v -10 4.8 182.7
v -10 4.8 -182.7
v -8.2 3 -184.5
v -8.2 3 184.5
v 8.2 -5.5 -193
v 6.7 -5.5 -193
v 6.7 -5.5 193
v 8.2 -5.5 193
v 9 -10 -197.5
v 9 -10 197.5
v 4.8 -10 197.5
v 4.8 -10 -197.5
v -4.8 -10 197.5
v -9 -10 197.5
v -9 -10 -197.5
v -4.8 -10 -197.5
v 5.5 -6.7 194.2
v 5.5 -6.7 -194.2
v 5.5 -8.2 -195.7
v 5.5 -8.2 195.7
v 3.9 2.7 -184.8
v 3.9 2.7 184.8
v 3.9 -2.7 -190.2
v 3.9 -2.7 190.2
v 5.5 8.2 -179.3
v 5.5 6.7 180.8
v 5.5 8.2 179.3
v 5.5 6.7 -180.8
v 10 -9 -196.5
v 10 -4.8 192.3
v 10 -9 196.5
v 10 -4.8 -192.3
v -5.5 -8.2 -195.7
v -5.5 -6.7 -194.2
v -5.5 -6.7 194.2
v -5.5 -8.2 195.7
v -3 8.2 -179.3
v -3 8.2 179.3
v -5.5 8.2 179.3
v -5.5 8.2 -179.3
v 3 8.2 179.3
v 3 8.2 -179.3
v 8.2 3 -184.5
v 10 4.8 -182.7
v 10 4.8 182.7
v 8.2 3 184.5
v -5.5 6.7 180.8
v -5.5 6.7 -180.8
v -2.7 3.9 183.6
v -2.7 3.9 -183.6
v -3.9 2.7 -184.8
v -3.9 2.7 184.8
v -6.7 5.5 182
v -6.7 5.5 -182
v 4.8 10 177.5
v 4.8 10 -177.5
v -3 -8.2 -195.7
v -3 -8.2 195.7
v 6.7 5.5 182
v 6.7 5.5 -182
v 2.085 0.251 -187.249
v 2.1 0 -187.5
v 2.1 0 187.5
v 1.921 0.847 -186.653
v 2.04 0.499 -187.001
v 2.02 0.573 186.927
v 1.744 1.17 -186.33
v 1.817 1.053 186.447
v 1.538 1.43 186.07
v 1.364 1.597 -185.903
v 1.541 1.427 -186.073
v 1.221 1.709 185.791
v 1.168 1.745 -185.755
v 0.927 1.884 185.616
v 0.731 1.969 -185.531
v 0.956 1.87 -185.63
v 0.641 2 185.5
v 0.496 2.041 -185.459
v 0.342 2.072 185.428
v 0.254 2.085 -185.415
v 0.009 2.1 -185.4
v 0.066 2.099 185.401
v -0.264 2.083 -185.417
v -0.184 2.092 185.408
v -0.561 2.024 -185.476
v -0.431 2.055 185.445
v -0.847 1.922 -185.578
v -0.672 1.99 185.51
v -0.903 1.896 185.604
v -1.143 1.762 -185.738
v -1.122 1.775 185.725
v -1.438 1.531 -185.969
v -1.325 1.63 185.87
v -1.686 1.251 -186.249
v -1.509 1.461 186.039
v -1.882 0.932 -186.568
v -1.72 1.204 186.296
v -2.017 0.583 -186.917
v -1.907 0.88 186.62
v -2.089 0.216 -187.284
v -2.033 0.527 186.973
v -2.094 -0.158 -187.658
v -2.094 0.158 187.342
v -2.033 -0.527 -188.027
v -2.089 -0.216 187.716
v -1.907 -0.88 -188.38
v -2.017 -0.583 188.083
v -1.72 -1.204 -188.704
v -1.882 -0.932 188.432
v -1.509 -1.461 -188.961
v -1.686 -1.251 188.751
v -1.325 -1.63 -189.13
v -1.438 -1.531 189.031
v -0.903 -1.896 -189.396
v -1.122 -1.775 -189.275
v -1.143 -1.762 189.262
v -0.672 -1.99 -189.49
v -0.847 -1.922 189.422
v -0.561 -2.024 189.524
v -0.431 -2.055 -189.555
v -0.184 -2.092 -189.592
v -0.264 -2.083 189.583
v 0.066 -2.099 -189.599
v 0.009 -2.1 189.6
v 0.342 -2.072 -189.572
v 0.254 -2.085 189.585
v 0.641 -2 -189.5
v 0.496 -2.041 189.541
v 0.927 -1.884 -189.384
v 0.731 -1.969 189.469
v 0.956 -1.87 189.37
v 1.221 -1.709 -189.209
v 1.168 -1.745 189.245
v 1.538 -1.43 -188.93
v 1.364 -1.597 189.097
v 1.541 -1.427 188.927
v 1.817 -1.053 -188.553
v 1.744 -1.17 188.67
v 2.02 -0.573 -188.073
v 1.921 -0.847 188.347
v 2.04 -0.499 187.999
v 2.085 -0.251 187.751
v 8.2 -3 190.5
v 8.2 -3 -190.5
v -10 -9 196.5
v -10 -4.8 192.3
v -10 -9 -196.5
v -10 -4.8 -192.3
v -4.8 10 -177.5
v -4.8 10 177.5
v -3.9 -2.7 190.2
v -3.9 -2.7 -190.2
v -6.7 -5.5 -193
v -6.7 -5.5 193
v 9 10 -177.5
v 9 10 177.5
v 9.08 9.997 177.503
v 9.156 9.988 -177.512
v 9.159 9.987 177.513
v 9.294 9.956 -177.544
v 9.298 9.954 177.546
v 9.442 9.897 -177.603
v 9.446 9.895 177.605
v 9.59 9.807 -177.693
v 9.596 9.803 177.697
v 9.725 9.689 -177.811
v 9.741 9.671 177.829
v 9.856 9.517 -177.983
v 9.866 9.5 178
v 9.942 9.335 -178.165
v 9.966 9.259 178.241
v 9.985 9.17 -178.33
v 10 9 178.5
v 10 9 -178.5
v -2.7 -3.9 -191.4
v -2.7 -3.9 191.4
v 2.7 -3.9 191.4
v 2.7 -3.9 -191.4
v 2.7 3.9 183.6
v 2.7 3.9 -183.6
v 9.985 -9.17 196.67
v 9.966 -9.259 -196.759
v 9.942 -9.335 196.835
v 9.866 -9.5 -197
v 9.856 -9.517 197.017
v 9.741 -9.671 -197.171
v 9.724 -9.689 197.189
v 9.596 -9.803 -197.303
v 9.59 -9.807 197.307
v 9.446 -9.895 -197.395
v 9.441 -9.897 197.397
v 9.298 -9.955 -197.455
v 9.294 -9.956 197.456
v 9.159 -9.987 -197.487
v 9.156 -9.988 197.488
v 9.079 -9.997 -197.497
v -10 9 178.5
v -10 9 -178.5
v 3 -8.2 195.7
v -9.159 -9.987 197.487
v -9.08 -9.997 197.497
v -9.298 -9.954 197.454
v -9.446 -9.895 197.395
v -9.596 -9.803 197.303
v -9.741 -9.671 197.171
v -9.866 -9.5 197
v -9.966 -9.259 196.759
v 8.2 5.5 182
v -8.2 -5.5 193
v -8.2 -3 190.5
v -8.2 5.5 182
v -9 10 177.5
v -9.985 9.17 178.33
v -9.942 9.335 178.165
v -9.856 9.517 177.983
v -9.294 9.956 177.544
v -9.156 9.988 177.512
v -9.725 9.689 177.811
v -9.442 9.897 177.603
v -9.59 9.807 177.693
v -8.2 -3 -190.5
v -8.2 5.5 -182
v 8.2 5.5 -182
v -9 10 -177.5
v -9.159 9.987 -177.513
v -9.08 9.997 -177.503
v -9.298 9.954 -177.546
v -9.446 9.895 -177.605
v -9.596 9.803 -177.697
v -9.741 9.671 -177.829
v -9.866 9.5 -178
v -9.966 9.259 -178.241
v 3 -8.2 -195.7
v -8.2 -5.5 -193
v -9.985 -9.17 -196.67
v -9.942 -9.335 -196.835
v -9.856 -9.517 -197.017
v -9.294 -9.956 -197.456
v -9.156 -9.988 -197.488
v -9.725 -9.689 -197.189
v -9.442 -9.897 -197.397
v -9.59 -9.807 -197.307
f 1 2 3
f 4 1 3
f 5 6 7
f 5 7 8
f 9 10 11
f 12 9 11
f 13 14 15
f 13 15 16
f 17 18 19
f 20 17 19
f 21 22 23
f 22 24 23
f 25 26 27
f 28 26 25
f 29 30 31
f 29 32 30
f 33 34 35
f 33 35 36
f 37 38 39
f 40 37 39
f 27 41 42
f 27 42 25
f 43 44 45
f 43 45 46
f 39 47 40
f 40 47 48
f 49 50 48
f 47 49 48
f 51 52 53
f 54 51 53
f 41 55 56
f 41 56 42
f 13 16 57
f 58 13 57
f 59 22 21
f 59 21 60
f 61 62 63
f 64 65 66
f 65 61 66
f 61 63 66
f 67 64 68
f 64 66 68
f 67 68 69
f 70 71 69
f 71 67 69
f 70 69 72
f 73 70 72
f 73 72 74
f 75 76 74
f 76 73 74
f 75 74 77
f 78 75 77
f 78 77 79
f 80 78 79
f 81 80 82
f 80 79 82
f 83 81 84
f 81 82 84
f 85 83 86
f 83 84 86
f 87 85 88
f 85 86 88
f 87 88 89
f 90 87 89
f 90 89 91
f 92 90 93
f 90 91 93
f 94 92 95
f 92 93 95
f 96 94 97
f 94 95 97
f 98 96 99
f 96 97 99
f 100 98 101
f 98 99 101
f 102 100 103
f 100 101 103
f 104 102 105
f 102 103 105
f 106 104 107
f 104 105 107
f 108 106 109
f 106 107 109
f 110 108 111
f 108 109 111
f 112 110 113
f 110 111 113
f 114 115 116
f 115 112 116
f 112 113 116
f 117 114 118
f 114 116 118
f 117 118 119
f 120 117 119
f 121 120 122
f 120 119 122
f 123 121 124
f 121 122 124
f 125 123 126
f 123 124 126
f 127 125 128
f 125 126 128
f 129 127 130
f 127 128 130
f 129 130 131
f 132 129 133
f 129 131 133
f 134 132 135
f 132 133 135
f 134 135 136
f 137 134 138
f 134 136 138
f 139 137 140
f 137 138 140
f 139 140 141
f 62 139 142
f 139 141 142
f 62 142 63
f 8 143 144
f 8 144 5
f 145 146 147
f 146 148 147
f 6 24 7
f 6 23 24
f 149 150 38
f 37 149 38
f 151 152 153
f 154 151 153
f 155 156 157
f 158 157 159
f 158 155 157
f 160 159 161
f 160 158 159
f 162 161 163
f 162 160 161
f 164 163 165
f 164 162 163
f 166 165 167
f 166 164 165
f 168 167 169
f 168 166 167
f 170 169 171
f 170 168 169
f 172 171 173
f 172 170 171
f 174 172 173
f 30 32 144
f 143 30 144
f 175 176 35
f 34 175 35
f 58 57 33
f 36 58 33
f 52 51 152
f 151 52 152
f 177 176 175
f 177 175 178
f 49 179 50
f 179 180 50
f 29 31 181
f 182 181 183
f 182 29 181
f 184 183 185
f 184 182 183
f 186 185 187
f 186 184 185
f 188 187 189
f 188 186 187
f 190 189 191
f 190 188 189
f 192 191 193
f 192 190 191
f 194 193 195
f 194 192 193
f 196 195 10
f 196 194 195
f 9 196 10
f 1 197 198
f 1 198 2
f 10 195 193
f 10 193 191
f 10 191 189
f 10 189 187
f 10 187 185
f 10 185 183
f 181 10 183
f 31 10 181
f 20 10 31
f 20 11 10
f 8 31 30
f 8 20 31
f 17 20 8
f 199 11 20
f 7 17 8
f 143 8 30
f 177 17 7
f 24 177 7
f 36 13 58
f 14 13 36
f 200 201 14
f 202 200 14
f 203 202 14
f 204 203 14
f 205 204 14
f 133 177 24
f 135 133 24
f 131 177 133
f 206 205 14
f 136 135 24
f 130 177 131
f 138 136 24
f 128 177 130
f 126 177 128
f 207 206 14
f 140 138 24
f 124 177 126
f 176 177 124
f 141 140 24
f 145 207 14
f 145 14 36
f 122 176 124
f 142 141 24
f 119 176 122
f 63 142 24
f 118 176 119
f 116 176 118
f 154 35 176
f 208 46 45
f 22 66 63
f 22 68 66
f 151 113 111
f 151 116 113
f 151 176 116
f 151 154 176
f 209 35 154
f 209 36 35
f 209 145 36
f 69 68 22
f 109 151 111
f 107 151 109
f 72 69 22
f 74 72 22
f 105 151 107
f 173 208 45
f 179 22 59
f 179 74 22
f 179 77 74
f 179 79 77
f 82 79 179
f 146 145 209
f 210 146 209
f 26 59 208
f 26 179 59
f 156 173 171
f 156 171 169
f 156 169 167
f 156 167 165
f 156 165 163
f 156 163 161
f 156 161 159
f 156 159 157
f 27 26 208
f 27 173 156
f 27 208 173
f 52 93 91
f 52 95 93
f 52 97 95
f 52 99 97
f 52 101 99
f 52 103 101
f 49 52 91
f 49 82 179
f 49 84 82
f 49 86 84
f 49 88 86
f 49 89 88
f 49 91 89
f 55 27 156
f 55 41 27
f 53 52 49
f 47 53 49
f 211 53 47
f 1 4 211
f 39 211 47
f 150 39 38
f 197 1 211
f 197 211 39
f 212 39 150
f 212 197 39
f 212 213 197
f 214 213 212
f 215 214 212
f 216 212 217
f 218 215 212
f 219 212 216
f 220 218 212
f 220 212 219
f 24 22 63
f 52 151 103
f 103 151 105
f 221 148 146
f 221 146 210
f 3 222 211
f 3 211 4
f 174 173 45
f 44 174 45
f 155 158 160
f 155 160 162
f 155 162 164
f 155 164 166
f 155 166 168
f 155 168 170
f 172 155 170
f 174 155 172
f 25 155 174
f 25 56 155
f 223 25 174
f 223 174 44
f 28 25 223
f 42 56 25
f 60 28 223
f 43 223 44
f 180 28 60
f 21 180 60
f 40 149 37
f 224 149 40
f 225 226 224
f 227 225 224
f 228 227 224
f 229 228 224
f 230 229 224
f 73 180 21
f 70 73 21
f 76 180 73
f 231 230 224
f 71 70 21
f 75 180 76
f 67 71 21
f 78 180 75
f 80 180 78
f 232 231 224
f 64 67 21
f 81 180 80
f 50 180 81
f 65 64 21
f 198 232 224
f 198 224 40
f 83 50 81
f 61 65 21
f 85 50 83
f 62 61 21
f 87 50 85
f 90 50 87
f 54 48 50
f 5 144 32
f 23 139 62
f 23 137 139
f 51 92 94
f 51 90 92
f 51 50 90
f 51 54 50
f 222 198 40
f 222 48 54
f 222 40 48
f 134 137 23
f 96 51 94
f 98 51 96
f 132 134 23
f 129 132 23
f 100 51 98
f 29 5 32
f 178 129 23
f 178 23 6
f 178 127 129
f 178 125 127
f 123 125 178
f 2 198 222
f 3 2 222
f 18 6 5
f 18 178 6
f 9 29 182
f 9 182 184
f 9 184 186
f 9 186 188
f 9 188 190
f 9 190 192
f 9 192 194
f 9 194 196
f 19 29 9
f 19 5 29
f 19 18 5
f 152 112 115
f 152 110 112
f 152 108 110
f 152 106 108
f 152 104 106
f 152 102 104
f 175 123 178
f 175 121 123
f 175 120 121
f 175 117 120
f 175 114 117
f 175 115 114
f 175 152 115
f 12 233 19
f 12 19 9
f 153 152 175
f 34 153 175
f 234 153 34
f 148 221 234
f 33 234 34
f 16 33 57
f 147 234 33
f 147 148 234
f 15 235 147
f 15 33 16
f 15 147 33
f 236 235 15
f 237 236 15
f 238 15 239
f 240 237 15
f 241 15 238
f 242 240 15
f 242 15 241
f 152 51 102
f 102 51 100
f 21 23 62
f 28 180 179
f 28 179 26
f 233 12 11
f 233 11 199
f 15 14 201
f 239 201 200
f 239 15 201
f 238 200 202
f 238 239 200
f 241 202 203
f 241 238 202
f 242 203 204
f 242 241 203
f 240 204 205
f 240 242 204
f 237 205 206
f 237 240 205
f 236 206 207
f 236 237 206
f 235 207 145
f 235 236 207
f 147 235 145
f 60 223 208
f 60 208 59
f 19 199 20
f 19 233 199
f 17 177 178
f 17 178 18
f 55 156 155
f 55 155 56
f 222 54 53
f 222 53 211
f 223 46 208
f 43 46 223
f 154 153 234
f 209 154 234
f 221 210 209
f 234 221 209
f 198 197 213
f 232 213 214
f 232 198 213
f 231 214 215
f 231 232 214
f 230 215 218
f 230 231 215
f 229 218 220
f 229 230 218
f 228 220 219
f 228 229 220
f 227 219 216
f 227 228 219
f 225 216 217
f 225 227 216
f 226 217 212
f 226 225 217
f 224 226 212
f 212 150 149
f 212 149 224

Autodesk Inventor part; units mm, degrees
ref_plane "YZ Plane" through (0, 0, 0) normal (1, 0, 0) x (0, 1, 0)
sketch "Эскиз1" plane through (0, 0, 0) normal (0, 0, 1) x (1, 0, 0)
  line L0 (-4.8, 10) -> (-3, 8.2)
  line L1 (-4.8, 10) -> (-2.2544, 10) construction
  line L2 (4.8, 10) -> (3, 8.2)
  line L3 (4.8, 10) -> (7.3456, 10) construction
  line L4 (10, 4.8) -> (8.2, 3)
  arc A0 (-9, 10) -> (-10, 9) centre (-9, 9) ccw
  arc A1 (10, 9) -> (9, 10) centre (9, 9) ccw
  arc A2 (-10, -9) -> (-9, -10) centre (-9, -9) ccw
  arc A3 (8.9996, -10) -> (10, -9) centre (9, -9) ccw
  line L5 (0, 3.9) -> (-2.7, 3.9)
  line L6 (0, 3.9) -> (2.7, 3.9)
  line L7 (3, 8.2) -> (5.5, 8.2)
  line L8 (2.7, 3.9) -> (5.5, 6.7)
  line L9 (5.5, 6.7) -> (5.5, 8.2)
  line L10 (3.9, 0) -> (3.9, 2.7)
  line L11 (3.9, 0) -> (3.9, -2.7)
  line L12 (3.9, 2.7) -> (6.7, 5.5)
  line L13 (3.9, 2.7) -> (7.8598, 2.7) construction
  line L14 (9, 10) -> (4.8, 10)
  line L15 (-4.8, 10) -> (-9, 10)
  line L16 (0, -3.9) -> (-2.7, -3.9)
  line L17 (0, -3.9) -> (2.7, -3.9)
  line L18 (-3.9, 0) -> (-3.9, -2.7)
  line L19 (-3.9, 0) -> (-3.9, 2.7)
  line L20 (8.2, 3) -> (8.2, 5.5)
  line L21 (8.2, 5.5) -> (6.7, 5.5)
  line L22 (-10, -4.8) -> (-7.4544, -4.8) construction
  line L23 (-4.8, -10) -> (-3, -8.2)
  line L24 (-4.8, -10) -> (-2.2544, -10) construction
  line L25 (4.7996, -10) -> (2.9996, -8.2)
  line L26 (4.7996, -10) -> (7.3452, -10) construction
  line L27 (10, -4.8) -> (8.2, -3)
  line L28 (8.9996, -10) -> (4.7996, -10)
  line L29 (-9, -10) -> (-4.8, -10)
  line L30 (10, -4.8) -> (10, -9)
  line L31 (10, 9) -> (10, 4.8)
  line L32 (-10, -4.8) -> (-10, -9)
  line L33 (-3, 8.2) -> (-5.5, 8.2)
  line L34 (-2.7, 3.9) -> (-5.5, 6.7)
  line L35 (-2.7, 3.9) -> (1.2598, 3.9) construction
  line L36 (-5.5, 6.7) -> (-5.5, 8.2)
  line L37 (-3.9, 2.7) -> (-6.7, 5.5)
  line L38 (-6.7, 5.5) -> (-8.2, 5.5)
  line L39 (-8.2, -3) -> (-8.2, -5.5)
  line L40 (-3, -8.2) -> (-5.5, -8.2)
  line L41 (2.9996, -8.2) -> (5.5, -8.2)
  line L42 (8.2, -3) -> (8.2, -5.5)
  line L43 (-3.9, -2.7) -> (-6.7, -5.5)
  line L44 (-6.7, -5.5) -> (-8.2, -5.5)
  line L45 (-2.7, -3.9) -> (-5.5, -6.7)
  line L46 (-5.5, -6.7) -> (-5.5, -8.2)
  line L47 (-10, 9) -> (-10, 4.8)
  line L48 (-10, 4.8) -> (-8.2, 3)
  line L49 (-8.2, 5.5) -> (-8.2, 3)
  line L50 (-10, -4.8) -> (-8.2, -3)
  line L51 (2.7, -3.9) -> (5.5, -6.7)
  line L52 (5.5, -6.7) -> (5.5, -8.2)
  line L53 (3.9, -2.7) -> (6.7, -5.5)
  line L54 (6.7, -5.5) -> (8.2, -5.5)
  point P0 (0, 0)
  dimension "d16" = 45
  dimension "d17" = 135
  dimension "d25" = 6
  dimension "d29" = 1
  dimension "d30" = 1
  dimension "d31" = 2.7
  dimension "d32" = 2.7
  dimension "d34" = 2.5
  dimension "d36" = 2.7
  dimension "d37" = 2.7
  dimension "d38" = 3.9
  dimension "d39" = 45
  dimension "d42" = 2.7
  dimension "d43" = 2.7
  dimension "d44" = 3.9
  dimension "d45" = 2.7
  dimension "d46" = 2.7
  dimension "d48" = 10
  dimension "d49" = 10
  dimension "d55" = 4.5
  dimension "d58" = 9
  dimension "d59" = 9
  dimension "d60" = 2.5
  dimension "d61" = 2.8
  dimension "d63" = 1.6971
  dimension "d65" = 45
  dimension "d67" = 135
  dimension "d73" = 10
  dimension "d74" = 10
  dimension "d77" = 18
  dimension "d78" = 18
  dimension "d79" = 135
  dimension "d80" = 135
  dimension "d81" = 4.5
  dimension "d82" = 1.8
  dimension "d83" = 1.8
  dimension "d84" = 1
  dimension "d85" = 1
  dimension "d87" = 4.5
  dimension "d89" = 1.8
  dimension "d91" = 135
  dimension "d92" = 1.6971
  dimension "d94" = 4.5
  dimension "d95" = 1.8
  dimension "d96" = 4.5
  dimension "d97" = 1.8
  dimension "d98" = 4.5
  dimension "d99" = 1.8
  dimension "d100" = 1.8
  dimension "d107" = 4.2
  dimension "d108" = 10
  dimension "d109" = 4.5
  dimension "d110" = 1.8
  dimension "d111" = 135
  dimension "d112" = 4.2
  dimension "d113" = 4.2
  dimension "d114" = 6
  dimension "d115" = 135
  dimension "d116" = 1.6971
  dimension "d117" = 4.2
  dimension "d118" = 4.2
  dimension "d119" = 4.5
  dimension "d120" = 135
  dimension "d121" = 1.5
extrude "Выдавливание2" add sketch "Эскиз1" along normal mid plane 395
sketch "Эскиз2" plane through (0, 0, 197.5) normal (0, 0, 1) x (1, 0, 0)
  circle A0 centre (0, 0) radius 2.1
  dimension "d131" = 4.2
extrude "Выдавливание3" cut sketch "Эскиз2" against normal through all
sketch "Эскиз3" plane through (10, 9, 197.5) normal (1, 0, 0) x (0, 0, -1)
  line L0 (395, -19) -> (375, 1)
  line L1 (395, -19) -> (423.2843, -19) construction
  point P0 (197.5, -9)
  dimension "d134" = 135
  dimension "d136" = 20
ref_plane "РабПлоскость1" through (10, -10, -197.5) normal (0, 0.7071, -0.7071) x (0, 0.7071, 0.7071)
split "Разделение2" plane through (10, -10, -197.5) removes the side toward (0, 0.7071, -0.7071)
sketch "Эскиз5" plane through (10, 4.8, 197.5) normal (1, 0, 0) x (0, 0, -1)
  line L0 (0, -13.8) -> (0, -14.8) projected
  line L1 (0, -14.8) -> (7.3, -7.5)
  line L2 (387.7, -7.5) -> (0, -7.5) projected
  line L3 (0, -14.8) -> (10.3238, -14.8) construction
  point P0 (197.5, -4.8)
  dimension "d138" = 45
ref_plane "РабПлоскость2" through (10, -10, 197.5) normal (0, 0.7071, 0.7071) x (0, 0.7071, -0.7071)
split "Разделение3" plane through (10, -10, 197.5) removes the side toward (0, 0.7071, 0.7071)
properties part number "Профиль_аллюминиевый400"
